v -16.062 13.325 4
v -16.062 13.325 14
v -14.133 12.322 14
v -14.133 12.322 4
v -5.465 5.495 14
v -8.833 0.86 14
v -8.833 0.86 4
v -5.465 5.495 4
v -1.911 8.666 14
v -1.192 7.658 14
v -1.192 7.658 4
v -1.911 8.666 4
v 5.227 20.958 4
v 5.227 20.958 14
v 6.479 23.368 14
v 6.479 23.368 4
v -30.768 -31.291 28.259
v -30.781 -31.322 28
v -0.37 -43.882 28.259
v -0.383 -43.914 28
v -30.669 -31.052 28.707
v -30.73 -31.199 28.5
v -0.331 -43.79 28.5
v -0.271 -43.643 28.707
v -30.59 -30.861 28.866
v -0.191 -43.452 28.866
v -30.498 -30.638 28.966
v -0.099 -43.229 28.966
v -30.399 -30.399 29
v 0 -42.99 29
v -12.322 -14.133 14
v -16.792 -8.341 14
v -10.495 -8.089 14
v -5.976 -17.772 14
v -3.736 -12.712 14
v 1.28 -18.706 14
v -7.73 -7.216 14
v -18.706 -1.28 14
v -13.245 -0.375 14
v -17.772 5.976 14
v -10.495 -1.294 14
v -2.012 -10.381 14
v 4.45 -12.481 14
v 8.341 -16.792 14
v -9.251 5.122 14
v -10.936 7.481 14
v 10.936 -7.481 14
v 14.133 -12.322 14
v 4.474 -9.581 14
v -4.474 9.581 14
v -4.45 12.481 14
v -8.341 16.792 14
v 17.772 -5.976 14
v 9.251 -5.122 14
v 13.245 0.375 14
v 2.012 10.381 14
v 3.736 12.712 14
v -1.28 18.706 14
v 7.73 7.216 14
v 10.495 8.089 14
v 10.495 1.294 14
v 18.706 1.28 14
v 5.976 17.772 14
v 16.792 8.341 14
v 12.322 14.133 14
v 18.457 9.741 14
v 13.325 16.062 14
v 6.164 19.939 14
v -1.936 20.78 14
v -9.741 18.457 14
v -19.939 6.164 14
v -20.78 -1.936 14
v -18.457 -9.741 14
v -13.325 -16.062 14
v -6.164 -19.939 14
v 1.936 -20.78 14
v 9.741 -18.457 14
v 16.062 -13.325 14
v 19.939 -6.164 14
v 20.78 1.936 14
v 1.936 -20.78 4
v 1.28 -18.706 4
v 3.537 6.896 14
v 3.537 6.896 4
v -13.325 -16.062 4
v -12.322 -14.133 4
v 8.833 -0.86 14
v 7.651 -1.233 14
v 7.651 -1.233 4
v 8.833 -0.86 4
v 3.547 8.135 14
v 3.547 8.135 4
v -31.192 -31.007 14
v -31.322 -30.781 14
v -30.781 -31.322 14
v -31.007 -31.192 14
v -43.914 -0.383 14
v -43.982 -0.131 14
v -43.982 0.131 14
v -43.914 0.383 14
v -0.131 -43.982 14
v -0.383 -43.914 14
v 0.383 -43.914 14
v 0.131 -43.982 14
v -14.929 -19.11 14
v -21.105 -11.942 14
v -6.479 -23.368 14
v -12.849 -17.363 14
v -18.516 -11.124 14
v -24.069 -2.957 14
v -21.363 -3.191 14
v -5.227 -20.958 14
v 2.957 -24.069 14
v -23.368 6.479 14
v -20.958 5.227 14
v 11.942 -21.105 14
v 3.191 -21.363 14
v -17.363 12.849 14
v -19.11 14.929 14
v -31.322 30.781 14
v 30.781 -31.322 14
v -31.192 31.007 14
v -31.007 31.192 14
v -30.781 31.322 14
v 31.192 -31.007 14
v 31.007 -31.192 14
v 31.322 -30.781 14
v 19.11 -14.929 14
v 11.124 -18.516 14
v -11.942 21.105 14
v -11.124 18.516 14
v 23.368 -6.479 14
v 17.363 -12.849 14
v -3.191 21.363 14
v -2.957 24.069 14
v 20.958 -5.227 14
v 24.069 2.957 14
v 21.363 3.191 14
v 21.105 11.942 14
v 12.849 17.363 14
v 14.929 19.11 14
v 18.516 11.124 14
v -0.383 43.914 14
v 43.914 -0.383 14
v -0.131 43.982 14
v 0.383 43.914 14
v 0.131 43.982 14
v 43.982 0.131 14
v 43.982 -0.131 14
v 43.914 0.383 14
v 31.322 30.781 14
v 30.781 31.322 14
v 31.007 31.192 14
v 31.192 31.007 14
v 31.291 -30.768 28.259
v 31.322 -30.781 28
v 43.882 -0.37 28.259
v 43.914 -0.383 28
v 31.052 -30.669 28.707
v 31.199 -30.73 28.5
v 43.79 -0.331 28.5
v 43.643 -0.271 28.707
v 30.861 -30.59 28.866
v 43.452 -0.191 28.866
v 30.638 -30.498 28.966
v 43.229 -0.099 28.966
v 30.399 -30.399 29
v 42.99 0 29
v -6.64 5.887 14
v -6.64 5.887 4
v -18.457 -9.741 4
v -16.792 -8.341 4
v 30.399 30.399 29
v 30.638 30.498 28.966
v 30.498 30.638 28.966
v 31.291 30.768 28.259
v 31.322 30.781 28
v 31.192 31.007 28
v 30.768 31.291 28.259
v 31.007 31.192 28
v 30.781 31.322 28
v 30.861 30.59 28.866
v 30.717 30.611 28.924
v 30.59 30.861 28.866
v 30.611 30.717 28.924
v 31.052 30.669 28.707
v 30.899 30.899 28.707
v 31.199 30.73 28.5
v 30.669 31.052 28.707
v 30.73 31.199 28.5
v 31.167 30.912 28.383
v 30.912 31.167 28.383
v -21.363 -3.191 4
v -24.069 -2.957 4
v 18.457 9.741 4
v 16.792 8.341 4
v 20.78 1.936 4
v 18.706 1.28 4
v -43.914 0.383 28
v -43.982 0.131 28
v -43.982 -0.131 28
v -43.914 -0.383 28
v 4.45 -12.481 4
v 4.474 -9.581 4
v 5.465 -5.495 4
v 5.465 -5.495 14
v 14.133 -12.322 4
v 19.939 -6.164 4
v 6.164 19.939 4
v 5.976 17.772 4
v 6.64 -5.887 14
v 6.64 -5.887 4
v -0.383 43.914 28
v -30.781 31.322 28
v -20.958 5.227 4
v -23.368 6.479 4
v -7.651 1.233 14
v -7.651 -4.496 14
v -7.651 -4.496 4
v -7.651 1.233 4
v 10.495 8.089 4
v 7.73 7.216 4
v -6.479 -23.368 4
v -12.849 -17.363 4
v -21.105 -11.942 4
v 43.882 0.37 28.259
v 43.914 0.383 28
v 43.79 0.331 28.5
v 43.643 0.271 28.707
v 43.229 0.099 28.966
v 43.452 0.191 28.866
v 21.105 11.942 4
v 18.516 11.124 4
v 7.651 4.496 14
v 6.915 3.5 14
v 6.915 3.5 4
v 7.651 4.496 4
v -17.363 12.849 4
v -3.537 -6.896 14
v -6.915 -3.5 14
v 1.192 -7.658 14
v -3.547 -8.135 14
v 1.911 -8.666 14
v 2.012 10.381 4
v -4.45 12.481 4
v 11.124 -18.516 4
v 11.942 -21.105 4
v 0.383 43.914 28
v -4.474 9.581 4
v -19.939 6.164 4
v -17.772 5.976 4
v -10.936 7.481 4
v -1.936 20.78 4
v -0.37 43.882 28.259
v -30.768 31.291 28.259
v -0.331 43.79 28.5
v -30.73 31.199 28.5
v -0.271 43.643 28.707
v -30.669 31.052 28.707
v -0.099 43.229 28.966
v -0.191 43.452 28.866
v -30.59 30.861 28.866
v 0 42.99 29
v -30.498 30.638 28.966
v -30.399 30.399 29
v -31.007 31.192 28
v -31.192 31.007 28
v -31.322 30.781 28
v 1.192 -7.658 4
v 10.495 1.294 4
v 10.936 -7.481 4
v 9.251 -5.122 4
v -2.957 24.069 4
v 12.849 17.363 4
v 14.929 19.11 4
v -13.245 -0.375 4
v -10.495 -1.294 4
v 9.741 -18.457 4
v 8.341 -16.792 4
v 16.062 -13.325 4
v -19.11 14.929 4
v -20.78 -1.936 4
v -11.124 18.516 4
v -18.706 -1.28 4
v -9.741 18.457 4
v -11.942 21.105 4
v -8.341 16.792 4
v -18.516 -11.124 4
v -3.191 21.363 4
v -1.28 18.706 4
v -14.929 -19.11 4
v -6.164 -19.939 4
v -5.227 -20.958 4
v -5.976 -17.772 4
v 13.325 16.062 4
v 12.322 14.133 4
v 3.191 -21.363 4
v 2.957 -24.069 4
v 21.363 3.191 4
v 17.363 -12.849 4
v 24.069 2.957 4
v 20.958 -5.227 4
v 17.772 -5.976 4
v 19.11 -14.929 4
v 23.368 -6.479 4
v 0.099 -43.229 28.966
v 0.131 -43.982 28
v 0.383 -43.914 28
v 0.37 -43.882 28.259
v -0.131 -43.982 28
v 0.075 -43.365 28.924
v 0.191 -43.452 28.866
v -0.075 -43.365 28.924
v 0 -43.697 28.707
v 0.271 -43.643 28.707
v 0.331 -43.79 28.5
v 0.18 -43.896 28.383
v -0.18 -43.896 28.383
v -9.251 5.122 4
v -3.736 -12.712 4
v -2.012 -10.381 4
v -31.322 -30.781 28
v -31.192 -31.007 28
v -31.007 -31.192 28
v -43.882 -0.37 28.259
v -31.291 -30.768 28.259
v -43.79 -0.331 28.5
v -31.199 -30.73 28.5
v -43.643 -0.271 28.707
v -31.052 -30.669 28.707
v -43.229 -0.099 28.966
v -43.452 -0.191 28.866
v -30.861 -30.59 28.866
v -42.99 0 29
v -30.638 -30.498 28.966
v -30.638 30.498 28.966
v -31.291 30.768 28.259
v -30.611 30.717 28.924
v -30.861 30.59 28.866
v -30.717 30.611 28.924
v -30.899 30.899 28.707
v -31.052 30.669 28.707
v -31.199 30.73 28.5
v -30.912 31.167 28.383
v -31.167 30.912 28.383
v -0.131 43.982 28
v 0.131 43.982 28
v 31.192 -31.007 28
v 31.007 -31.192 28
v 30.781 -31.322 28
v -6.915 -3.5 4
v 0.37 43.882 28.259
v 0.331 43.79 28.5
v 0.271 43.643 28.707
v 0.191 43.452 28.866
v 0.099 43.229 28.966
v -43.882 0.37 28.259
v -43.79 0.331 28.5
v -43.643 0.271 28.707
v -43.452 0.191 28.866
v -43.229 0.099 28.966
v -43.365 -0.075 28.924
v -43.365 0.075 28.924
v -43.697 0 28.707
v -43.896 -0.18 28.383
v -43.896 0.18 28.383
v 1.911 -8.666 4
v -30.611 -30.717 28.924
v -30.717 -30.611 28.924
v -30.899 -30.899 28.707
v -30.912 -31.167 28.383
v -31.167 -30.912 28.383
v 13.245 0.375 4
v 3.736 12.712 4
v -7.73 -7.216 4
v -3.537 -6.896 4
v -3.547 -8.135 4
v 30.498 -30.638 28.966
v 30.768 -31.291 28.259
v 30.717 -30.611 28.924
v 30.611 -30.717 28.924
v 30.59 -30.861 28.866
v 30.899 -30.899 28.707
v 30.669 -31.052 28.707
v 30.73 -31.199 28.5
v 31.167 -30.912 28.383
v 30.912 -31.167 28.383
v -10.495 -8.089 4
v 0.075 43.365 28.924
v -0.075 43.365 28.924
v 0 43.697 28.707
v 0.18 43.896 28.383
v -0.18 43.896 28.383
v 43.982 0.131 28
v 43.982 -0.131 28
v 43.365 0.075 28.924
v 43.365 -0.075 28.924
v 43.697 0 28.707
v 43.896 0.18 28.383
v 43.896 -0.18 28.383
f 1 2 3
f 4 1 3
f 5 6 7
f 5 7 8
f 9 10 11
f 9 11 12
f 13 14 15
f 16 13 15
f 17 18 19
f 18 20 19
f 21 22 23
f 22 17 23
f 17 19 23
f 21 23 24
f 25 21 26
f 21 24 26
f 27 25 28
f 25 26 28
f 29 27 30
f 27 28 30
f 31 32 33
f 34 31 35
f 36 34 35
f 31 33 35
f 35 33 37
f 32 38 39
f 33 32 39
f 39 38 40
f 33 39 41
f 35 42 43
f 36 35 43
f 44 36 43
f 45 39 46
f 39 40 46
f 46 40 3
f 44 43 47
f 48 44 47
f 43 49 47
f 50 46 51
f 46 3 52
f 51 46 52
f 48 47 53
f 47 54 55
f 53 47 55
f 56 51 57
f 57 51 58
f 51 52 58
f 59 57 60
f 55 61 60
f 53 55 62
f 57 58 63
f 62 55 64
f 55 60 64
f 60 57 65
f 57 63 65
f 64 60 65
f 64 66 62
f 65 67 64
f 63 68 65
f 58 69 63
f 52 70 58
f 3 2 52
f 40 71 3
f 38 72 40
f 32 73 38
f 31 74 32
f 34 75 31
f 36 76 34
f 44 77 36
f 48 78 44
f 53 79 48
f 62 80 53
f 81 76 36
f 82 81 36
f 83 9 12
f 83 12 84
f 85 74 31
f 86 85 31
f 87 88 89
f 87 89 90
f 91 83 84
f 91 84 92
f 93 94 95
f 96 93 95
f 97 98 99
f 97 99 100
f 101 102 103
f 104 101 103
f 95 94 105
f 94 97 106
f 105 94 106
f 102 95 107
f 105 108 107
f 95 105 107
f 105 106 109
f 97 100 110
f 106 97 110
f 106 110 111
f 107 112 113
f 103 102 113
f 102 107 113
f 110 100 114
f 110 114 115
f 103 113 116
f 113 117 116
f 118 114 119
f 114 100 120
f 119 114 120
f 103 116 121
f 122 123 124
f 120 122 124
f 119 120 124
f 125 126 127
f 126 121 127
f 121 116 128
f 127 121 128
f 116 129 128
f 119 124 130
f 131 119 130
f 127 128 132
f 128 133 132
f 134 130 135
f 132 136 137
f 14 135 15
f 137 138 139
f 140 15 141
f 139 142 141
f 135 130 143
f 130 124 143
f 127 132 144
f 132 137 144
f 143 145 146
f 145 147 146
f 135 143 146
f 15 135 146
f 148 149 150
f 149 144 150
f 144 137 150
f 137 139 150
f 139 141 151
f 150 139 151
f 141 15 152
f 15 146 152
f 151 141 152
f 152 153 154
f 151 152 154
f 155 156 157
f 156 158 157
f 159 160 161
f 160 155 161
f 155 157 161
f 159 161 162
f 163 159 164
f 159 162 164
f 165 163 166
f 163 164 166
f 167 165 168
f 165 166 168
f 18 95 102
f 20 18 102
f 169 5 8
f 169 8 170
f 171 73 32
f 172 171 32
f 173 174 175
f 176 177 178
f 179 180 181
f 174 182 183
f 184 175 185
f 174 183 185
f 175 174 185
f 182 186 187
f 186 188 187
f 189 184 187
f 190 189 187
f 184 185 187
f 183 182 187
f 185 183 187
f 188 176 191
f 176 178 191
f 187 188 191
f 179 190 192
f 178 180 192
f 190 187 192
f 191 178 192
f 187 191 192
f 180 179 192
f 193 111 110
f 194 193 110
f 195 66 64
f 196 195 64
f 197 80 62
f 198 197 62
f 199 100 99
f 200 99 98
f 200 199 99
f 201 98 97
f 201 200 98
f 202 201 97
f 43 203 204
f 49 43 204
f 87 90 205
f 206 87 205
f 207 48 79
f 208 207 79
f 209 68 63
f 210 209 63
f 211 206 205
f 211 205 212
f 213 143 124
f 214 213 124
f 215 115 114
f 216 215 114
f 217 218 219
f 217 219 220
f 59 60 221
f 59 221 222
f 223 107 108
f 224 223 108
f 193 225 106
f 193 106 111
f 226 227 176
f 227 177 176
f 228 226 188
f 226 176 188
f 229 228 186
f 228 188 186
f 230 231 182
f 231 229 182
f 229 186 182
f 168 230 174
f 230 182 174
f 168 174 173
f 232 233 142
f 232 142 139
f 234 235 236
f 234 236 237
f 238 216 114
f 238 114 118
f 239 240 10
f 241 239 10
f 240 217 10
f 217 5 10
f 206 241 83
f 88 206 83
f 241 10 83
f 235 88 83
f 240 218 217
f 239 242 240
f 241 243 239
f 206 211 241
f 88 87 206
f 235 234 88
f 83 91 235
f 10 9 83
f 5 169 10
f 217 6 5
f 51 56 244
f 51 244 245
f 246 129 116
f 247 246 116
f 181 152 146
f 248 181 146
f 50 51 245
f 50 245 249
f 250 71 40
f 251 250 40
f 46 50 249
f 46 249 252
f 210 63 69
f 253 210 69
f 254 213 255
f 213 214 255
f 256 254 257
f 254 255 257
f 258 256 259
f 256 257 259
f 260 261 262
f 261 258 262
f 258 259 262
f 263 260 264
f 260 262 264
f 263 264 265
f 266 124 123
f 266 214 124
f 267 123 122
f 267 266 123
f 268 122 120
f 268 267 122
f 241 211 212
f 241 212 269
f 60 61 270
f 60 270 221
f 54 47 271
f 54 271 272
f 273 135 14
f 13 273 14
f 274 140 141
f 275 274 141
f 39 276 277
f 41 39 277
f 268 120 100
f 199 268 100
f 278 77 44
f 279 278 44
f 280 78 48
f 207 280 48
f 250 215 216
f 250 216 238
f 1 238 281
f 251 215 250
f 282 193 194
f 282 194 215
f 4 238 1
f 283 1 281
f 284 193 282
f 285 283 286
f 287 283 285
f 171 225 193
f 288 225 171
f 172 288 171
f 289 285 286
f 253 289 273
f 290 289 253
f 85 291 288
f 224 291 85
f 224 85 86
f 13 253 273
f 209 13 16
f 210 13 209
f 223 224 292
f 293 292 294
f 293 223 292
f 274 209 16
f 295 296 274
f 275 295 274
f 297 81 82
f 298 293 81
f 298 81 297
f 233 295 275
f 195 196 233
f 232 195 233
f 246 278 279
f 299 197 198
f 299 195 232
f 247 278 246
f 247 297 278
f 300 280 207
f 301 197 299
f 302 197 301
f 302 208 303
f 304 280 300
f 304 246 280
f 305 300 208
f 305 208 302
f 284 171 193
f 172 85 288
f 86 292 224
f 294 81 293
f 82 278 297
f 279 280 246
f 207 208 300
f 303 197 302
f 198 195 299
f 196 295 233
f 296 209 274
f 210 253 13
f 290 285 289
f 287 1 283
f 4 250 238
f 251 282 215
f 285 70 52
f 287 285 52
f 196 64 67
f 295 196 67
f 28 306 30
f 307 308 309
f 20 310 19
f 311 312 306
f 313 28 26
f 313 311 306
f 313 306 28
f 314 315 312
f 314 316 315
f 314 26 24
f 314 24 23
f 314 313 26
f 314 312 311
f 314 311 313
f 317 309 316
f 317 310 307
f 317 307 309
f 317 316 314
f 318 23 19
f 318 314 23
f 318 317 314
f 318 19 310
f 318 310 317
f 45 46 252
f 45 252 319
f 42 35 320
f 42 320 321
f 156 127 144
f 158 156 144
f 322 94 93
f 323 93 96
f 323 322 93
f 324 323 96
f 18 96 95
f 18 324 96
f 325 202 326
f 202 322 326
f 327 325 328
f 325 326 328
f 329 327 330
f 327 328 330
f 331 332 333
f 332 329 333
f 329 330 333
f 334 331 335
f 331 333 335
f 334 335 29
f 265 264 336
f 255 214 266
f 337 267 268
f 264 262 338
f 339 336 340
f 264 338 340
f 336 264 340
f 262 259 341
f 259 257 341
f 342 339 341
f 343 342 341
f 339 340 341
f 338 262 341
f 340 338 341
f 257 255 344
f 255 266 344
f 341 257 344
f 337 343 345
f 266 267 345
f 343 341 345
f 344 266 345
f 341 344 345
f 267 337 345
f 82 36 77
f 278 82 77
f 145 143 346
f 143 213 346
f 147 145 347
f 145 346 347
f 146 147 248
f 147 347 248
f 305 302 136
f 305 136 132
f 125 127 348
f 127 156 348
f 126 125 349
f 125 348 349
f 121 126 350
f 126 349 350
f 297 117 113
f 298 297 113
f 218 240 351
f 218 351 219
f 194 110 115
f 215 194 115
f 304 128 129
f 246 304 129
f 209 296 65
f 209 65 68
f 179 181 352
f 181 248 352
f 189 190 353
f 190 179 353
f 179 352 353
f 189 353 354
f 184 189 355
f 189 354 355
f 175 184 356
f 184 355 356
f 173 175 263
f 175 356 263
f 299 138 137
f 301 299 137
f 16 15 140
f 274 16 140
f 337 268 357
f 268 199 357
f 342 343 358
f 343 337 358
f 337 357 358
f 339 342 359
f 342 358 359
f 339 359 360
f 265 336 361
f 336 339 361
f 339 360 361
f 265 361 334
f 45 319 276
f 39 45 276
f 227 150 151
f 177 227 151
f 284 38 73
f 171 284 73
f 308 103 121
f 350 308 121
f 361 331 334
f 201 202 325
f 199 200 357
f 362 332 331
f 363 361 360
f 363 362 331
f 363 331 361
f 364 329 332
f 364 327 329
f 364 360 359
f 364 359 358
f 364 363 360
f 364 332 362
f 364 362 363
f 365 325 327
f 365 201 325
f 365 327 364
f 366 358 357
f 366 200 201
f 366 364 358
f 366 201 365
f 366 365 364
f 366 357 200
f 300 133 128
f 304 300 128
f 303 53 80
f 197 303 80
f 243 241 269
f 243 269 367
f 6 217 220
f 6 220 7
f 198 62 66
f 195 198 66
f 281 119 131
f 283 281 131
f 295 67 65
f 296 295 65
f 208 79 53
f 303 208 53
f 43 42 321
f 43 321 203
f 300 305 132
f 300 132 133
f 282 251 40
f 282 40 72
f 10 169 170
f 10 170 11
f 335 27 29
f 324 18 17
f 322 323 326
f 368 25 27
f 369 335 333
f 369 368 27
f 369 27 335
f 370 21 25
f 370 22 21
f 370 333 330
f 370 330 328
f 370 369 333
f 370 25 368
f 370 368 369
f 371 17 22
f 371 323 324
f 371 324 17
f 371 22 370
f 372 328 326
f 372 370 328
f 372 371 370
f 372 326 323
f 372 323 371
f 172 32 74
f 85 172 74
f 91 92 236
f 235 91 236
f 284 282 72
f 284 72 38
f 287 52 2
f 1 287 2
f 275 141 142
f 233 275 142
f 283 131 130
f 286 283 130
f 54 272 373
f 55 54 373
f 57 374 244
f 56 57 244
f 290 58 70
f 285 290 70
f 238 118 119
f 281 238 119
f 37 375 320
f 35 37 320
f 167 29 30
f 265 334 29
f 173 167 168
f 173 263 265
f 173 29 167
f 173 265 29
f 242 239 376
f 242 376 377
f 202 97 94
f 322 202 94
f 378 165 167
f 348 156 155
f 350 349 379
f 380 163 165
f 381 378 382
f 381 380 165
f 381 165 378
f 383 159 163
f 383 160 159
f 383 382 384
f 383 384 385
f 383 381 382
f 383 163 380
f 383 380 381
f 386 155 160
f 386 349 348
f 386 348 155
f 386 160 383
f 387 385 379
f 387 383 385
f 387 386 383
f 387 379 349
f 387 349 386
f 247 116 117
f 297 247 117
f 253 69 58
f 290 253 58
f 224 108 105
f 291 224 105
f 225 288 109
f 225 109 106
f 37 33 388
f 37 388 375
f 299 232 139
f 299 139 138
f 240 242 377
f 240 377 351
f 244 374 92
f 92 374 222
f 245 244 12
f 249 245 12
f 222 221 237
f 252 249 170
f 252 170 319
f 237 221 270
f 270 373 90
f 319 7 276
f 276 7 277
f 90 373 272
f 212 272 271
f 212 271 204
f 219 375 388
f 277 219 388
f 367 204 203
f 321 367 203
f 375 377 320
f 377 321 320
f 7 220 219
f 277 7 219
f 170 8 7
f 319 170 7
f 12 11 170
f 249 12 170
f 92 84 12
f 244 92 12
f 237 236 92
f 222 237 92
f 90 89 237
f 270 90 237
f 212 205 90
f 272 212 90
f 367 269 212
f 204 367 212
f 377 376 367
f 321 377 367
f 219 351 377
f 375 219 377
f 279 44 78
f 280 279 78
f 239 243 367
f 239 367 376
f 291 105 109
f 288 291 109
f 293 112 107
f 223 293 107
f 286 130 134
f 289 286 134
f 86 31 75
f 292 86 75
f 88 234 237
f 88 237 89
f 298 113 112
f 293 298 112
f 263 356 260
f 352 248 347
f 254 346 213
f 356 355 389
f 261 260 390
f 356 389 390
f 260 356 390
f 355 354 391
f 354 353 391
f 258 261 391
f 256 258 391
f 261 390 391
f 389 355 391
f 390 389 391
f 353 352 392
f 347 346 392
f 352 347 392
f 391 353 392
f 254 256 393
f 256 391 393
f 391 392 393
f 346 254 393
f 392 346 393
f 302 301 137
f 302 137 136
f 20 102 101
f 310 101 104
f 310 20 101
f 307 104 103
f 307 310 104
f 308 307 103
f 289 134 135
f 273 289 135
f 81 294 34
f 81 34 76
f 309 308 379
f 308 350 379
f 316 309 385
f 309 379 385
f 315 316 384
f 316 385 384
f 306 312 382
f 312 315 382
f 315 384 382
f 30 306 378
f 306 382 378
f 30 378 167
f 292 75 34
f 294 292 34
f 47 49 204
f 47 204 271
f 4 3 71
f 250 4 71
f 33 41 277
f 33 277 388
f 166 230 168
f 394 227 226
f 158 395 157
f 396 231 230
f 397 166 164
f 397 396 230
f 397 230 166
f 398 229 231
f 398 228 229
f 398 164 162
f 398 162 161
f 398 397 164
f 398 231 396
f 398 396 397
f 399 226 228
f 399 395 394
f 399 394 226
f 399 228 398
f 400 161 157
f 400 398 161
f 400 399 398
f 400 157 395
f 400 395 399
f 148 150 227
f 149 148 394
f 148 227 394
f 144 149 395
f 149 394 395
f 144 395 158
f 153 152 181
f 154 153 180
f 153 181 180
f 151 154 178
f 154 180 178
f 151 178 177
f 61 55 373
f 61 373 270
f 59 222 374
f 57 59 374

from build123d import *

# Parameters (mm, degrees)
PAD003_DEPTH          = 15
PAD007_DEPTH          = 10
POLARPATTERN006_COUNT = 10
PAD008_DEPTH          = 10
POLARPATTERN007_COUNT = 16
FILLET001_R           = 1


with BuildPart() as part:
    # Sketch007 → Pad003 (new body)
    with BuildSketch(Plane.XY.offset(14)):
        Polygon((0, 44.072464), (-31.163938, 31.163938), (-44.072464, 0), (-31.163938, -31.163938), (0, -44.072464), (31.163938, -31.163938), (44.072464, 0), (31.163938, 31.163938), align=None)
    extrude(amount=PAD003_DEPTH)

    # Sketch015 (on Face9 of Pad003) → Pad007 (join)
    with BuildSketch(Plane(origin=(0, 0, 14), x_dir=(1, 0, 0), z_dir=(0, 0, -1))):
        Polygon((-10.494645, 8.088568), (-7.65128, 7.190822), (-7.65128, -1.233051), (-10.494645, -0.335305), align=None)
    pad007 = extrude(amount=PAD007_DEPTH)

    # PolarPattern006: Pad007 ×10 about axis
    polarpattern006_axis = Axis((0, 0, 14), (0, 0, -1))
    for i in range(1, POLARPATTERN006_COUNT):
        add(pad007.rotate(polarpattern006_axis, i * 360 / POLARPATTERN006_COUNT))

    # Sketch016 (on Face4 of PolarPattern006) → Pad008 (join)
    with BuildSketch(Plane(origin=(0, 0, 14), x_dir=(1, 0, 0), z_dir=(0, 0, -1))):
        Polygon((-24.069083, 2.956647), (-20.580814, -6.219331), (-17.772233, -5.975805), (-21.260501, 3.200173), align=None)
    pad008 = extrude(amount=PAD008_DEPTH)

    # PolarPattern007: Pad008 ×16 about axis
    polarpattern007_axis = Axis((0, 0, 14), (0, 0, -1))
    for i in range(1, POLARPATTERN007_COUNT):
        add(pad008.rotate(polarpattern007_axis, i * 360 / POLARPATTERN007_COUNT))

    # Fillet001
    fillet001_edges = [part.edges().sort_by_distance(p)[0] for p in [
        (-37.618201, 15.581969, 29),
        (-31.163938, 31.163938, 21.5),
        (-44.072464, 0, 21.5),
        (-37.618201, -15.581969, 29),
        (-31.163938, -31.163938, 21.5),
        (-15.581969, -37.618201, 29),
        (-15.581969, 37.618201, 29),
        (0, 44.072464, 21.5),
        (15.581969, 37.618201, 29),
        (0, -44.072464, 21.5),
        (15.581969, -37.618201, 29),
        (31.163938, -31.163938, 21.5),
        (37.618201, -15.581969, 29),
        (44.072464, 0, 21.5),
        (31.163938, 31.163938, 21.5),
        (37.618201, 15.581969, 29),
    ]]
    fillet(fillet001_edges, radius=FILLET001_R)


solid = part.part
